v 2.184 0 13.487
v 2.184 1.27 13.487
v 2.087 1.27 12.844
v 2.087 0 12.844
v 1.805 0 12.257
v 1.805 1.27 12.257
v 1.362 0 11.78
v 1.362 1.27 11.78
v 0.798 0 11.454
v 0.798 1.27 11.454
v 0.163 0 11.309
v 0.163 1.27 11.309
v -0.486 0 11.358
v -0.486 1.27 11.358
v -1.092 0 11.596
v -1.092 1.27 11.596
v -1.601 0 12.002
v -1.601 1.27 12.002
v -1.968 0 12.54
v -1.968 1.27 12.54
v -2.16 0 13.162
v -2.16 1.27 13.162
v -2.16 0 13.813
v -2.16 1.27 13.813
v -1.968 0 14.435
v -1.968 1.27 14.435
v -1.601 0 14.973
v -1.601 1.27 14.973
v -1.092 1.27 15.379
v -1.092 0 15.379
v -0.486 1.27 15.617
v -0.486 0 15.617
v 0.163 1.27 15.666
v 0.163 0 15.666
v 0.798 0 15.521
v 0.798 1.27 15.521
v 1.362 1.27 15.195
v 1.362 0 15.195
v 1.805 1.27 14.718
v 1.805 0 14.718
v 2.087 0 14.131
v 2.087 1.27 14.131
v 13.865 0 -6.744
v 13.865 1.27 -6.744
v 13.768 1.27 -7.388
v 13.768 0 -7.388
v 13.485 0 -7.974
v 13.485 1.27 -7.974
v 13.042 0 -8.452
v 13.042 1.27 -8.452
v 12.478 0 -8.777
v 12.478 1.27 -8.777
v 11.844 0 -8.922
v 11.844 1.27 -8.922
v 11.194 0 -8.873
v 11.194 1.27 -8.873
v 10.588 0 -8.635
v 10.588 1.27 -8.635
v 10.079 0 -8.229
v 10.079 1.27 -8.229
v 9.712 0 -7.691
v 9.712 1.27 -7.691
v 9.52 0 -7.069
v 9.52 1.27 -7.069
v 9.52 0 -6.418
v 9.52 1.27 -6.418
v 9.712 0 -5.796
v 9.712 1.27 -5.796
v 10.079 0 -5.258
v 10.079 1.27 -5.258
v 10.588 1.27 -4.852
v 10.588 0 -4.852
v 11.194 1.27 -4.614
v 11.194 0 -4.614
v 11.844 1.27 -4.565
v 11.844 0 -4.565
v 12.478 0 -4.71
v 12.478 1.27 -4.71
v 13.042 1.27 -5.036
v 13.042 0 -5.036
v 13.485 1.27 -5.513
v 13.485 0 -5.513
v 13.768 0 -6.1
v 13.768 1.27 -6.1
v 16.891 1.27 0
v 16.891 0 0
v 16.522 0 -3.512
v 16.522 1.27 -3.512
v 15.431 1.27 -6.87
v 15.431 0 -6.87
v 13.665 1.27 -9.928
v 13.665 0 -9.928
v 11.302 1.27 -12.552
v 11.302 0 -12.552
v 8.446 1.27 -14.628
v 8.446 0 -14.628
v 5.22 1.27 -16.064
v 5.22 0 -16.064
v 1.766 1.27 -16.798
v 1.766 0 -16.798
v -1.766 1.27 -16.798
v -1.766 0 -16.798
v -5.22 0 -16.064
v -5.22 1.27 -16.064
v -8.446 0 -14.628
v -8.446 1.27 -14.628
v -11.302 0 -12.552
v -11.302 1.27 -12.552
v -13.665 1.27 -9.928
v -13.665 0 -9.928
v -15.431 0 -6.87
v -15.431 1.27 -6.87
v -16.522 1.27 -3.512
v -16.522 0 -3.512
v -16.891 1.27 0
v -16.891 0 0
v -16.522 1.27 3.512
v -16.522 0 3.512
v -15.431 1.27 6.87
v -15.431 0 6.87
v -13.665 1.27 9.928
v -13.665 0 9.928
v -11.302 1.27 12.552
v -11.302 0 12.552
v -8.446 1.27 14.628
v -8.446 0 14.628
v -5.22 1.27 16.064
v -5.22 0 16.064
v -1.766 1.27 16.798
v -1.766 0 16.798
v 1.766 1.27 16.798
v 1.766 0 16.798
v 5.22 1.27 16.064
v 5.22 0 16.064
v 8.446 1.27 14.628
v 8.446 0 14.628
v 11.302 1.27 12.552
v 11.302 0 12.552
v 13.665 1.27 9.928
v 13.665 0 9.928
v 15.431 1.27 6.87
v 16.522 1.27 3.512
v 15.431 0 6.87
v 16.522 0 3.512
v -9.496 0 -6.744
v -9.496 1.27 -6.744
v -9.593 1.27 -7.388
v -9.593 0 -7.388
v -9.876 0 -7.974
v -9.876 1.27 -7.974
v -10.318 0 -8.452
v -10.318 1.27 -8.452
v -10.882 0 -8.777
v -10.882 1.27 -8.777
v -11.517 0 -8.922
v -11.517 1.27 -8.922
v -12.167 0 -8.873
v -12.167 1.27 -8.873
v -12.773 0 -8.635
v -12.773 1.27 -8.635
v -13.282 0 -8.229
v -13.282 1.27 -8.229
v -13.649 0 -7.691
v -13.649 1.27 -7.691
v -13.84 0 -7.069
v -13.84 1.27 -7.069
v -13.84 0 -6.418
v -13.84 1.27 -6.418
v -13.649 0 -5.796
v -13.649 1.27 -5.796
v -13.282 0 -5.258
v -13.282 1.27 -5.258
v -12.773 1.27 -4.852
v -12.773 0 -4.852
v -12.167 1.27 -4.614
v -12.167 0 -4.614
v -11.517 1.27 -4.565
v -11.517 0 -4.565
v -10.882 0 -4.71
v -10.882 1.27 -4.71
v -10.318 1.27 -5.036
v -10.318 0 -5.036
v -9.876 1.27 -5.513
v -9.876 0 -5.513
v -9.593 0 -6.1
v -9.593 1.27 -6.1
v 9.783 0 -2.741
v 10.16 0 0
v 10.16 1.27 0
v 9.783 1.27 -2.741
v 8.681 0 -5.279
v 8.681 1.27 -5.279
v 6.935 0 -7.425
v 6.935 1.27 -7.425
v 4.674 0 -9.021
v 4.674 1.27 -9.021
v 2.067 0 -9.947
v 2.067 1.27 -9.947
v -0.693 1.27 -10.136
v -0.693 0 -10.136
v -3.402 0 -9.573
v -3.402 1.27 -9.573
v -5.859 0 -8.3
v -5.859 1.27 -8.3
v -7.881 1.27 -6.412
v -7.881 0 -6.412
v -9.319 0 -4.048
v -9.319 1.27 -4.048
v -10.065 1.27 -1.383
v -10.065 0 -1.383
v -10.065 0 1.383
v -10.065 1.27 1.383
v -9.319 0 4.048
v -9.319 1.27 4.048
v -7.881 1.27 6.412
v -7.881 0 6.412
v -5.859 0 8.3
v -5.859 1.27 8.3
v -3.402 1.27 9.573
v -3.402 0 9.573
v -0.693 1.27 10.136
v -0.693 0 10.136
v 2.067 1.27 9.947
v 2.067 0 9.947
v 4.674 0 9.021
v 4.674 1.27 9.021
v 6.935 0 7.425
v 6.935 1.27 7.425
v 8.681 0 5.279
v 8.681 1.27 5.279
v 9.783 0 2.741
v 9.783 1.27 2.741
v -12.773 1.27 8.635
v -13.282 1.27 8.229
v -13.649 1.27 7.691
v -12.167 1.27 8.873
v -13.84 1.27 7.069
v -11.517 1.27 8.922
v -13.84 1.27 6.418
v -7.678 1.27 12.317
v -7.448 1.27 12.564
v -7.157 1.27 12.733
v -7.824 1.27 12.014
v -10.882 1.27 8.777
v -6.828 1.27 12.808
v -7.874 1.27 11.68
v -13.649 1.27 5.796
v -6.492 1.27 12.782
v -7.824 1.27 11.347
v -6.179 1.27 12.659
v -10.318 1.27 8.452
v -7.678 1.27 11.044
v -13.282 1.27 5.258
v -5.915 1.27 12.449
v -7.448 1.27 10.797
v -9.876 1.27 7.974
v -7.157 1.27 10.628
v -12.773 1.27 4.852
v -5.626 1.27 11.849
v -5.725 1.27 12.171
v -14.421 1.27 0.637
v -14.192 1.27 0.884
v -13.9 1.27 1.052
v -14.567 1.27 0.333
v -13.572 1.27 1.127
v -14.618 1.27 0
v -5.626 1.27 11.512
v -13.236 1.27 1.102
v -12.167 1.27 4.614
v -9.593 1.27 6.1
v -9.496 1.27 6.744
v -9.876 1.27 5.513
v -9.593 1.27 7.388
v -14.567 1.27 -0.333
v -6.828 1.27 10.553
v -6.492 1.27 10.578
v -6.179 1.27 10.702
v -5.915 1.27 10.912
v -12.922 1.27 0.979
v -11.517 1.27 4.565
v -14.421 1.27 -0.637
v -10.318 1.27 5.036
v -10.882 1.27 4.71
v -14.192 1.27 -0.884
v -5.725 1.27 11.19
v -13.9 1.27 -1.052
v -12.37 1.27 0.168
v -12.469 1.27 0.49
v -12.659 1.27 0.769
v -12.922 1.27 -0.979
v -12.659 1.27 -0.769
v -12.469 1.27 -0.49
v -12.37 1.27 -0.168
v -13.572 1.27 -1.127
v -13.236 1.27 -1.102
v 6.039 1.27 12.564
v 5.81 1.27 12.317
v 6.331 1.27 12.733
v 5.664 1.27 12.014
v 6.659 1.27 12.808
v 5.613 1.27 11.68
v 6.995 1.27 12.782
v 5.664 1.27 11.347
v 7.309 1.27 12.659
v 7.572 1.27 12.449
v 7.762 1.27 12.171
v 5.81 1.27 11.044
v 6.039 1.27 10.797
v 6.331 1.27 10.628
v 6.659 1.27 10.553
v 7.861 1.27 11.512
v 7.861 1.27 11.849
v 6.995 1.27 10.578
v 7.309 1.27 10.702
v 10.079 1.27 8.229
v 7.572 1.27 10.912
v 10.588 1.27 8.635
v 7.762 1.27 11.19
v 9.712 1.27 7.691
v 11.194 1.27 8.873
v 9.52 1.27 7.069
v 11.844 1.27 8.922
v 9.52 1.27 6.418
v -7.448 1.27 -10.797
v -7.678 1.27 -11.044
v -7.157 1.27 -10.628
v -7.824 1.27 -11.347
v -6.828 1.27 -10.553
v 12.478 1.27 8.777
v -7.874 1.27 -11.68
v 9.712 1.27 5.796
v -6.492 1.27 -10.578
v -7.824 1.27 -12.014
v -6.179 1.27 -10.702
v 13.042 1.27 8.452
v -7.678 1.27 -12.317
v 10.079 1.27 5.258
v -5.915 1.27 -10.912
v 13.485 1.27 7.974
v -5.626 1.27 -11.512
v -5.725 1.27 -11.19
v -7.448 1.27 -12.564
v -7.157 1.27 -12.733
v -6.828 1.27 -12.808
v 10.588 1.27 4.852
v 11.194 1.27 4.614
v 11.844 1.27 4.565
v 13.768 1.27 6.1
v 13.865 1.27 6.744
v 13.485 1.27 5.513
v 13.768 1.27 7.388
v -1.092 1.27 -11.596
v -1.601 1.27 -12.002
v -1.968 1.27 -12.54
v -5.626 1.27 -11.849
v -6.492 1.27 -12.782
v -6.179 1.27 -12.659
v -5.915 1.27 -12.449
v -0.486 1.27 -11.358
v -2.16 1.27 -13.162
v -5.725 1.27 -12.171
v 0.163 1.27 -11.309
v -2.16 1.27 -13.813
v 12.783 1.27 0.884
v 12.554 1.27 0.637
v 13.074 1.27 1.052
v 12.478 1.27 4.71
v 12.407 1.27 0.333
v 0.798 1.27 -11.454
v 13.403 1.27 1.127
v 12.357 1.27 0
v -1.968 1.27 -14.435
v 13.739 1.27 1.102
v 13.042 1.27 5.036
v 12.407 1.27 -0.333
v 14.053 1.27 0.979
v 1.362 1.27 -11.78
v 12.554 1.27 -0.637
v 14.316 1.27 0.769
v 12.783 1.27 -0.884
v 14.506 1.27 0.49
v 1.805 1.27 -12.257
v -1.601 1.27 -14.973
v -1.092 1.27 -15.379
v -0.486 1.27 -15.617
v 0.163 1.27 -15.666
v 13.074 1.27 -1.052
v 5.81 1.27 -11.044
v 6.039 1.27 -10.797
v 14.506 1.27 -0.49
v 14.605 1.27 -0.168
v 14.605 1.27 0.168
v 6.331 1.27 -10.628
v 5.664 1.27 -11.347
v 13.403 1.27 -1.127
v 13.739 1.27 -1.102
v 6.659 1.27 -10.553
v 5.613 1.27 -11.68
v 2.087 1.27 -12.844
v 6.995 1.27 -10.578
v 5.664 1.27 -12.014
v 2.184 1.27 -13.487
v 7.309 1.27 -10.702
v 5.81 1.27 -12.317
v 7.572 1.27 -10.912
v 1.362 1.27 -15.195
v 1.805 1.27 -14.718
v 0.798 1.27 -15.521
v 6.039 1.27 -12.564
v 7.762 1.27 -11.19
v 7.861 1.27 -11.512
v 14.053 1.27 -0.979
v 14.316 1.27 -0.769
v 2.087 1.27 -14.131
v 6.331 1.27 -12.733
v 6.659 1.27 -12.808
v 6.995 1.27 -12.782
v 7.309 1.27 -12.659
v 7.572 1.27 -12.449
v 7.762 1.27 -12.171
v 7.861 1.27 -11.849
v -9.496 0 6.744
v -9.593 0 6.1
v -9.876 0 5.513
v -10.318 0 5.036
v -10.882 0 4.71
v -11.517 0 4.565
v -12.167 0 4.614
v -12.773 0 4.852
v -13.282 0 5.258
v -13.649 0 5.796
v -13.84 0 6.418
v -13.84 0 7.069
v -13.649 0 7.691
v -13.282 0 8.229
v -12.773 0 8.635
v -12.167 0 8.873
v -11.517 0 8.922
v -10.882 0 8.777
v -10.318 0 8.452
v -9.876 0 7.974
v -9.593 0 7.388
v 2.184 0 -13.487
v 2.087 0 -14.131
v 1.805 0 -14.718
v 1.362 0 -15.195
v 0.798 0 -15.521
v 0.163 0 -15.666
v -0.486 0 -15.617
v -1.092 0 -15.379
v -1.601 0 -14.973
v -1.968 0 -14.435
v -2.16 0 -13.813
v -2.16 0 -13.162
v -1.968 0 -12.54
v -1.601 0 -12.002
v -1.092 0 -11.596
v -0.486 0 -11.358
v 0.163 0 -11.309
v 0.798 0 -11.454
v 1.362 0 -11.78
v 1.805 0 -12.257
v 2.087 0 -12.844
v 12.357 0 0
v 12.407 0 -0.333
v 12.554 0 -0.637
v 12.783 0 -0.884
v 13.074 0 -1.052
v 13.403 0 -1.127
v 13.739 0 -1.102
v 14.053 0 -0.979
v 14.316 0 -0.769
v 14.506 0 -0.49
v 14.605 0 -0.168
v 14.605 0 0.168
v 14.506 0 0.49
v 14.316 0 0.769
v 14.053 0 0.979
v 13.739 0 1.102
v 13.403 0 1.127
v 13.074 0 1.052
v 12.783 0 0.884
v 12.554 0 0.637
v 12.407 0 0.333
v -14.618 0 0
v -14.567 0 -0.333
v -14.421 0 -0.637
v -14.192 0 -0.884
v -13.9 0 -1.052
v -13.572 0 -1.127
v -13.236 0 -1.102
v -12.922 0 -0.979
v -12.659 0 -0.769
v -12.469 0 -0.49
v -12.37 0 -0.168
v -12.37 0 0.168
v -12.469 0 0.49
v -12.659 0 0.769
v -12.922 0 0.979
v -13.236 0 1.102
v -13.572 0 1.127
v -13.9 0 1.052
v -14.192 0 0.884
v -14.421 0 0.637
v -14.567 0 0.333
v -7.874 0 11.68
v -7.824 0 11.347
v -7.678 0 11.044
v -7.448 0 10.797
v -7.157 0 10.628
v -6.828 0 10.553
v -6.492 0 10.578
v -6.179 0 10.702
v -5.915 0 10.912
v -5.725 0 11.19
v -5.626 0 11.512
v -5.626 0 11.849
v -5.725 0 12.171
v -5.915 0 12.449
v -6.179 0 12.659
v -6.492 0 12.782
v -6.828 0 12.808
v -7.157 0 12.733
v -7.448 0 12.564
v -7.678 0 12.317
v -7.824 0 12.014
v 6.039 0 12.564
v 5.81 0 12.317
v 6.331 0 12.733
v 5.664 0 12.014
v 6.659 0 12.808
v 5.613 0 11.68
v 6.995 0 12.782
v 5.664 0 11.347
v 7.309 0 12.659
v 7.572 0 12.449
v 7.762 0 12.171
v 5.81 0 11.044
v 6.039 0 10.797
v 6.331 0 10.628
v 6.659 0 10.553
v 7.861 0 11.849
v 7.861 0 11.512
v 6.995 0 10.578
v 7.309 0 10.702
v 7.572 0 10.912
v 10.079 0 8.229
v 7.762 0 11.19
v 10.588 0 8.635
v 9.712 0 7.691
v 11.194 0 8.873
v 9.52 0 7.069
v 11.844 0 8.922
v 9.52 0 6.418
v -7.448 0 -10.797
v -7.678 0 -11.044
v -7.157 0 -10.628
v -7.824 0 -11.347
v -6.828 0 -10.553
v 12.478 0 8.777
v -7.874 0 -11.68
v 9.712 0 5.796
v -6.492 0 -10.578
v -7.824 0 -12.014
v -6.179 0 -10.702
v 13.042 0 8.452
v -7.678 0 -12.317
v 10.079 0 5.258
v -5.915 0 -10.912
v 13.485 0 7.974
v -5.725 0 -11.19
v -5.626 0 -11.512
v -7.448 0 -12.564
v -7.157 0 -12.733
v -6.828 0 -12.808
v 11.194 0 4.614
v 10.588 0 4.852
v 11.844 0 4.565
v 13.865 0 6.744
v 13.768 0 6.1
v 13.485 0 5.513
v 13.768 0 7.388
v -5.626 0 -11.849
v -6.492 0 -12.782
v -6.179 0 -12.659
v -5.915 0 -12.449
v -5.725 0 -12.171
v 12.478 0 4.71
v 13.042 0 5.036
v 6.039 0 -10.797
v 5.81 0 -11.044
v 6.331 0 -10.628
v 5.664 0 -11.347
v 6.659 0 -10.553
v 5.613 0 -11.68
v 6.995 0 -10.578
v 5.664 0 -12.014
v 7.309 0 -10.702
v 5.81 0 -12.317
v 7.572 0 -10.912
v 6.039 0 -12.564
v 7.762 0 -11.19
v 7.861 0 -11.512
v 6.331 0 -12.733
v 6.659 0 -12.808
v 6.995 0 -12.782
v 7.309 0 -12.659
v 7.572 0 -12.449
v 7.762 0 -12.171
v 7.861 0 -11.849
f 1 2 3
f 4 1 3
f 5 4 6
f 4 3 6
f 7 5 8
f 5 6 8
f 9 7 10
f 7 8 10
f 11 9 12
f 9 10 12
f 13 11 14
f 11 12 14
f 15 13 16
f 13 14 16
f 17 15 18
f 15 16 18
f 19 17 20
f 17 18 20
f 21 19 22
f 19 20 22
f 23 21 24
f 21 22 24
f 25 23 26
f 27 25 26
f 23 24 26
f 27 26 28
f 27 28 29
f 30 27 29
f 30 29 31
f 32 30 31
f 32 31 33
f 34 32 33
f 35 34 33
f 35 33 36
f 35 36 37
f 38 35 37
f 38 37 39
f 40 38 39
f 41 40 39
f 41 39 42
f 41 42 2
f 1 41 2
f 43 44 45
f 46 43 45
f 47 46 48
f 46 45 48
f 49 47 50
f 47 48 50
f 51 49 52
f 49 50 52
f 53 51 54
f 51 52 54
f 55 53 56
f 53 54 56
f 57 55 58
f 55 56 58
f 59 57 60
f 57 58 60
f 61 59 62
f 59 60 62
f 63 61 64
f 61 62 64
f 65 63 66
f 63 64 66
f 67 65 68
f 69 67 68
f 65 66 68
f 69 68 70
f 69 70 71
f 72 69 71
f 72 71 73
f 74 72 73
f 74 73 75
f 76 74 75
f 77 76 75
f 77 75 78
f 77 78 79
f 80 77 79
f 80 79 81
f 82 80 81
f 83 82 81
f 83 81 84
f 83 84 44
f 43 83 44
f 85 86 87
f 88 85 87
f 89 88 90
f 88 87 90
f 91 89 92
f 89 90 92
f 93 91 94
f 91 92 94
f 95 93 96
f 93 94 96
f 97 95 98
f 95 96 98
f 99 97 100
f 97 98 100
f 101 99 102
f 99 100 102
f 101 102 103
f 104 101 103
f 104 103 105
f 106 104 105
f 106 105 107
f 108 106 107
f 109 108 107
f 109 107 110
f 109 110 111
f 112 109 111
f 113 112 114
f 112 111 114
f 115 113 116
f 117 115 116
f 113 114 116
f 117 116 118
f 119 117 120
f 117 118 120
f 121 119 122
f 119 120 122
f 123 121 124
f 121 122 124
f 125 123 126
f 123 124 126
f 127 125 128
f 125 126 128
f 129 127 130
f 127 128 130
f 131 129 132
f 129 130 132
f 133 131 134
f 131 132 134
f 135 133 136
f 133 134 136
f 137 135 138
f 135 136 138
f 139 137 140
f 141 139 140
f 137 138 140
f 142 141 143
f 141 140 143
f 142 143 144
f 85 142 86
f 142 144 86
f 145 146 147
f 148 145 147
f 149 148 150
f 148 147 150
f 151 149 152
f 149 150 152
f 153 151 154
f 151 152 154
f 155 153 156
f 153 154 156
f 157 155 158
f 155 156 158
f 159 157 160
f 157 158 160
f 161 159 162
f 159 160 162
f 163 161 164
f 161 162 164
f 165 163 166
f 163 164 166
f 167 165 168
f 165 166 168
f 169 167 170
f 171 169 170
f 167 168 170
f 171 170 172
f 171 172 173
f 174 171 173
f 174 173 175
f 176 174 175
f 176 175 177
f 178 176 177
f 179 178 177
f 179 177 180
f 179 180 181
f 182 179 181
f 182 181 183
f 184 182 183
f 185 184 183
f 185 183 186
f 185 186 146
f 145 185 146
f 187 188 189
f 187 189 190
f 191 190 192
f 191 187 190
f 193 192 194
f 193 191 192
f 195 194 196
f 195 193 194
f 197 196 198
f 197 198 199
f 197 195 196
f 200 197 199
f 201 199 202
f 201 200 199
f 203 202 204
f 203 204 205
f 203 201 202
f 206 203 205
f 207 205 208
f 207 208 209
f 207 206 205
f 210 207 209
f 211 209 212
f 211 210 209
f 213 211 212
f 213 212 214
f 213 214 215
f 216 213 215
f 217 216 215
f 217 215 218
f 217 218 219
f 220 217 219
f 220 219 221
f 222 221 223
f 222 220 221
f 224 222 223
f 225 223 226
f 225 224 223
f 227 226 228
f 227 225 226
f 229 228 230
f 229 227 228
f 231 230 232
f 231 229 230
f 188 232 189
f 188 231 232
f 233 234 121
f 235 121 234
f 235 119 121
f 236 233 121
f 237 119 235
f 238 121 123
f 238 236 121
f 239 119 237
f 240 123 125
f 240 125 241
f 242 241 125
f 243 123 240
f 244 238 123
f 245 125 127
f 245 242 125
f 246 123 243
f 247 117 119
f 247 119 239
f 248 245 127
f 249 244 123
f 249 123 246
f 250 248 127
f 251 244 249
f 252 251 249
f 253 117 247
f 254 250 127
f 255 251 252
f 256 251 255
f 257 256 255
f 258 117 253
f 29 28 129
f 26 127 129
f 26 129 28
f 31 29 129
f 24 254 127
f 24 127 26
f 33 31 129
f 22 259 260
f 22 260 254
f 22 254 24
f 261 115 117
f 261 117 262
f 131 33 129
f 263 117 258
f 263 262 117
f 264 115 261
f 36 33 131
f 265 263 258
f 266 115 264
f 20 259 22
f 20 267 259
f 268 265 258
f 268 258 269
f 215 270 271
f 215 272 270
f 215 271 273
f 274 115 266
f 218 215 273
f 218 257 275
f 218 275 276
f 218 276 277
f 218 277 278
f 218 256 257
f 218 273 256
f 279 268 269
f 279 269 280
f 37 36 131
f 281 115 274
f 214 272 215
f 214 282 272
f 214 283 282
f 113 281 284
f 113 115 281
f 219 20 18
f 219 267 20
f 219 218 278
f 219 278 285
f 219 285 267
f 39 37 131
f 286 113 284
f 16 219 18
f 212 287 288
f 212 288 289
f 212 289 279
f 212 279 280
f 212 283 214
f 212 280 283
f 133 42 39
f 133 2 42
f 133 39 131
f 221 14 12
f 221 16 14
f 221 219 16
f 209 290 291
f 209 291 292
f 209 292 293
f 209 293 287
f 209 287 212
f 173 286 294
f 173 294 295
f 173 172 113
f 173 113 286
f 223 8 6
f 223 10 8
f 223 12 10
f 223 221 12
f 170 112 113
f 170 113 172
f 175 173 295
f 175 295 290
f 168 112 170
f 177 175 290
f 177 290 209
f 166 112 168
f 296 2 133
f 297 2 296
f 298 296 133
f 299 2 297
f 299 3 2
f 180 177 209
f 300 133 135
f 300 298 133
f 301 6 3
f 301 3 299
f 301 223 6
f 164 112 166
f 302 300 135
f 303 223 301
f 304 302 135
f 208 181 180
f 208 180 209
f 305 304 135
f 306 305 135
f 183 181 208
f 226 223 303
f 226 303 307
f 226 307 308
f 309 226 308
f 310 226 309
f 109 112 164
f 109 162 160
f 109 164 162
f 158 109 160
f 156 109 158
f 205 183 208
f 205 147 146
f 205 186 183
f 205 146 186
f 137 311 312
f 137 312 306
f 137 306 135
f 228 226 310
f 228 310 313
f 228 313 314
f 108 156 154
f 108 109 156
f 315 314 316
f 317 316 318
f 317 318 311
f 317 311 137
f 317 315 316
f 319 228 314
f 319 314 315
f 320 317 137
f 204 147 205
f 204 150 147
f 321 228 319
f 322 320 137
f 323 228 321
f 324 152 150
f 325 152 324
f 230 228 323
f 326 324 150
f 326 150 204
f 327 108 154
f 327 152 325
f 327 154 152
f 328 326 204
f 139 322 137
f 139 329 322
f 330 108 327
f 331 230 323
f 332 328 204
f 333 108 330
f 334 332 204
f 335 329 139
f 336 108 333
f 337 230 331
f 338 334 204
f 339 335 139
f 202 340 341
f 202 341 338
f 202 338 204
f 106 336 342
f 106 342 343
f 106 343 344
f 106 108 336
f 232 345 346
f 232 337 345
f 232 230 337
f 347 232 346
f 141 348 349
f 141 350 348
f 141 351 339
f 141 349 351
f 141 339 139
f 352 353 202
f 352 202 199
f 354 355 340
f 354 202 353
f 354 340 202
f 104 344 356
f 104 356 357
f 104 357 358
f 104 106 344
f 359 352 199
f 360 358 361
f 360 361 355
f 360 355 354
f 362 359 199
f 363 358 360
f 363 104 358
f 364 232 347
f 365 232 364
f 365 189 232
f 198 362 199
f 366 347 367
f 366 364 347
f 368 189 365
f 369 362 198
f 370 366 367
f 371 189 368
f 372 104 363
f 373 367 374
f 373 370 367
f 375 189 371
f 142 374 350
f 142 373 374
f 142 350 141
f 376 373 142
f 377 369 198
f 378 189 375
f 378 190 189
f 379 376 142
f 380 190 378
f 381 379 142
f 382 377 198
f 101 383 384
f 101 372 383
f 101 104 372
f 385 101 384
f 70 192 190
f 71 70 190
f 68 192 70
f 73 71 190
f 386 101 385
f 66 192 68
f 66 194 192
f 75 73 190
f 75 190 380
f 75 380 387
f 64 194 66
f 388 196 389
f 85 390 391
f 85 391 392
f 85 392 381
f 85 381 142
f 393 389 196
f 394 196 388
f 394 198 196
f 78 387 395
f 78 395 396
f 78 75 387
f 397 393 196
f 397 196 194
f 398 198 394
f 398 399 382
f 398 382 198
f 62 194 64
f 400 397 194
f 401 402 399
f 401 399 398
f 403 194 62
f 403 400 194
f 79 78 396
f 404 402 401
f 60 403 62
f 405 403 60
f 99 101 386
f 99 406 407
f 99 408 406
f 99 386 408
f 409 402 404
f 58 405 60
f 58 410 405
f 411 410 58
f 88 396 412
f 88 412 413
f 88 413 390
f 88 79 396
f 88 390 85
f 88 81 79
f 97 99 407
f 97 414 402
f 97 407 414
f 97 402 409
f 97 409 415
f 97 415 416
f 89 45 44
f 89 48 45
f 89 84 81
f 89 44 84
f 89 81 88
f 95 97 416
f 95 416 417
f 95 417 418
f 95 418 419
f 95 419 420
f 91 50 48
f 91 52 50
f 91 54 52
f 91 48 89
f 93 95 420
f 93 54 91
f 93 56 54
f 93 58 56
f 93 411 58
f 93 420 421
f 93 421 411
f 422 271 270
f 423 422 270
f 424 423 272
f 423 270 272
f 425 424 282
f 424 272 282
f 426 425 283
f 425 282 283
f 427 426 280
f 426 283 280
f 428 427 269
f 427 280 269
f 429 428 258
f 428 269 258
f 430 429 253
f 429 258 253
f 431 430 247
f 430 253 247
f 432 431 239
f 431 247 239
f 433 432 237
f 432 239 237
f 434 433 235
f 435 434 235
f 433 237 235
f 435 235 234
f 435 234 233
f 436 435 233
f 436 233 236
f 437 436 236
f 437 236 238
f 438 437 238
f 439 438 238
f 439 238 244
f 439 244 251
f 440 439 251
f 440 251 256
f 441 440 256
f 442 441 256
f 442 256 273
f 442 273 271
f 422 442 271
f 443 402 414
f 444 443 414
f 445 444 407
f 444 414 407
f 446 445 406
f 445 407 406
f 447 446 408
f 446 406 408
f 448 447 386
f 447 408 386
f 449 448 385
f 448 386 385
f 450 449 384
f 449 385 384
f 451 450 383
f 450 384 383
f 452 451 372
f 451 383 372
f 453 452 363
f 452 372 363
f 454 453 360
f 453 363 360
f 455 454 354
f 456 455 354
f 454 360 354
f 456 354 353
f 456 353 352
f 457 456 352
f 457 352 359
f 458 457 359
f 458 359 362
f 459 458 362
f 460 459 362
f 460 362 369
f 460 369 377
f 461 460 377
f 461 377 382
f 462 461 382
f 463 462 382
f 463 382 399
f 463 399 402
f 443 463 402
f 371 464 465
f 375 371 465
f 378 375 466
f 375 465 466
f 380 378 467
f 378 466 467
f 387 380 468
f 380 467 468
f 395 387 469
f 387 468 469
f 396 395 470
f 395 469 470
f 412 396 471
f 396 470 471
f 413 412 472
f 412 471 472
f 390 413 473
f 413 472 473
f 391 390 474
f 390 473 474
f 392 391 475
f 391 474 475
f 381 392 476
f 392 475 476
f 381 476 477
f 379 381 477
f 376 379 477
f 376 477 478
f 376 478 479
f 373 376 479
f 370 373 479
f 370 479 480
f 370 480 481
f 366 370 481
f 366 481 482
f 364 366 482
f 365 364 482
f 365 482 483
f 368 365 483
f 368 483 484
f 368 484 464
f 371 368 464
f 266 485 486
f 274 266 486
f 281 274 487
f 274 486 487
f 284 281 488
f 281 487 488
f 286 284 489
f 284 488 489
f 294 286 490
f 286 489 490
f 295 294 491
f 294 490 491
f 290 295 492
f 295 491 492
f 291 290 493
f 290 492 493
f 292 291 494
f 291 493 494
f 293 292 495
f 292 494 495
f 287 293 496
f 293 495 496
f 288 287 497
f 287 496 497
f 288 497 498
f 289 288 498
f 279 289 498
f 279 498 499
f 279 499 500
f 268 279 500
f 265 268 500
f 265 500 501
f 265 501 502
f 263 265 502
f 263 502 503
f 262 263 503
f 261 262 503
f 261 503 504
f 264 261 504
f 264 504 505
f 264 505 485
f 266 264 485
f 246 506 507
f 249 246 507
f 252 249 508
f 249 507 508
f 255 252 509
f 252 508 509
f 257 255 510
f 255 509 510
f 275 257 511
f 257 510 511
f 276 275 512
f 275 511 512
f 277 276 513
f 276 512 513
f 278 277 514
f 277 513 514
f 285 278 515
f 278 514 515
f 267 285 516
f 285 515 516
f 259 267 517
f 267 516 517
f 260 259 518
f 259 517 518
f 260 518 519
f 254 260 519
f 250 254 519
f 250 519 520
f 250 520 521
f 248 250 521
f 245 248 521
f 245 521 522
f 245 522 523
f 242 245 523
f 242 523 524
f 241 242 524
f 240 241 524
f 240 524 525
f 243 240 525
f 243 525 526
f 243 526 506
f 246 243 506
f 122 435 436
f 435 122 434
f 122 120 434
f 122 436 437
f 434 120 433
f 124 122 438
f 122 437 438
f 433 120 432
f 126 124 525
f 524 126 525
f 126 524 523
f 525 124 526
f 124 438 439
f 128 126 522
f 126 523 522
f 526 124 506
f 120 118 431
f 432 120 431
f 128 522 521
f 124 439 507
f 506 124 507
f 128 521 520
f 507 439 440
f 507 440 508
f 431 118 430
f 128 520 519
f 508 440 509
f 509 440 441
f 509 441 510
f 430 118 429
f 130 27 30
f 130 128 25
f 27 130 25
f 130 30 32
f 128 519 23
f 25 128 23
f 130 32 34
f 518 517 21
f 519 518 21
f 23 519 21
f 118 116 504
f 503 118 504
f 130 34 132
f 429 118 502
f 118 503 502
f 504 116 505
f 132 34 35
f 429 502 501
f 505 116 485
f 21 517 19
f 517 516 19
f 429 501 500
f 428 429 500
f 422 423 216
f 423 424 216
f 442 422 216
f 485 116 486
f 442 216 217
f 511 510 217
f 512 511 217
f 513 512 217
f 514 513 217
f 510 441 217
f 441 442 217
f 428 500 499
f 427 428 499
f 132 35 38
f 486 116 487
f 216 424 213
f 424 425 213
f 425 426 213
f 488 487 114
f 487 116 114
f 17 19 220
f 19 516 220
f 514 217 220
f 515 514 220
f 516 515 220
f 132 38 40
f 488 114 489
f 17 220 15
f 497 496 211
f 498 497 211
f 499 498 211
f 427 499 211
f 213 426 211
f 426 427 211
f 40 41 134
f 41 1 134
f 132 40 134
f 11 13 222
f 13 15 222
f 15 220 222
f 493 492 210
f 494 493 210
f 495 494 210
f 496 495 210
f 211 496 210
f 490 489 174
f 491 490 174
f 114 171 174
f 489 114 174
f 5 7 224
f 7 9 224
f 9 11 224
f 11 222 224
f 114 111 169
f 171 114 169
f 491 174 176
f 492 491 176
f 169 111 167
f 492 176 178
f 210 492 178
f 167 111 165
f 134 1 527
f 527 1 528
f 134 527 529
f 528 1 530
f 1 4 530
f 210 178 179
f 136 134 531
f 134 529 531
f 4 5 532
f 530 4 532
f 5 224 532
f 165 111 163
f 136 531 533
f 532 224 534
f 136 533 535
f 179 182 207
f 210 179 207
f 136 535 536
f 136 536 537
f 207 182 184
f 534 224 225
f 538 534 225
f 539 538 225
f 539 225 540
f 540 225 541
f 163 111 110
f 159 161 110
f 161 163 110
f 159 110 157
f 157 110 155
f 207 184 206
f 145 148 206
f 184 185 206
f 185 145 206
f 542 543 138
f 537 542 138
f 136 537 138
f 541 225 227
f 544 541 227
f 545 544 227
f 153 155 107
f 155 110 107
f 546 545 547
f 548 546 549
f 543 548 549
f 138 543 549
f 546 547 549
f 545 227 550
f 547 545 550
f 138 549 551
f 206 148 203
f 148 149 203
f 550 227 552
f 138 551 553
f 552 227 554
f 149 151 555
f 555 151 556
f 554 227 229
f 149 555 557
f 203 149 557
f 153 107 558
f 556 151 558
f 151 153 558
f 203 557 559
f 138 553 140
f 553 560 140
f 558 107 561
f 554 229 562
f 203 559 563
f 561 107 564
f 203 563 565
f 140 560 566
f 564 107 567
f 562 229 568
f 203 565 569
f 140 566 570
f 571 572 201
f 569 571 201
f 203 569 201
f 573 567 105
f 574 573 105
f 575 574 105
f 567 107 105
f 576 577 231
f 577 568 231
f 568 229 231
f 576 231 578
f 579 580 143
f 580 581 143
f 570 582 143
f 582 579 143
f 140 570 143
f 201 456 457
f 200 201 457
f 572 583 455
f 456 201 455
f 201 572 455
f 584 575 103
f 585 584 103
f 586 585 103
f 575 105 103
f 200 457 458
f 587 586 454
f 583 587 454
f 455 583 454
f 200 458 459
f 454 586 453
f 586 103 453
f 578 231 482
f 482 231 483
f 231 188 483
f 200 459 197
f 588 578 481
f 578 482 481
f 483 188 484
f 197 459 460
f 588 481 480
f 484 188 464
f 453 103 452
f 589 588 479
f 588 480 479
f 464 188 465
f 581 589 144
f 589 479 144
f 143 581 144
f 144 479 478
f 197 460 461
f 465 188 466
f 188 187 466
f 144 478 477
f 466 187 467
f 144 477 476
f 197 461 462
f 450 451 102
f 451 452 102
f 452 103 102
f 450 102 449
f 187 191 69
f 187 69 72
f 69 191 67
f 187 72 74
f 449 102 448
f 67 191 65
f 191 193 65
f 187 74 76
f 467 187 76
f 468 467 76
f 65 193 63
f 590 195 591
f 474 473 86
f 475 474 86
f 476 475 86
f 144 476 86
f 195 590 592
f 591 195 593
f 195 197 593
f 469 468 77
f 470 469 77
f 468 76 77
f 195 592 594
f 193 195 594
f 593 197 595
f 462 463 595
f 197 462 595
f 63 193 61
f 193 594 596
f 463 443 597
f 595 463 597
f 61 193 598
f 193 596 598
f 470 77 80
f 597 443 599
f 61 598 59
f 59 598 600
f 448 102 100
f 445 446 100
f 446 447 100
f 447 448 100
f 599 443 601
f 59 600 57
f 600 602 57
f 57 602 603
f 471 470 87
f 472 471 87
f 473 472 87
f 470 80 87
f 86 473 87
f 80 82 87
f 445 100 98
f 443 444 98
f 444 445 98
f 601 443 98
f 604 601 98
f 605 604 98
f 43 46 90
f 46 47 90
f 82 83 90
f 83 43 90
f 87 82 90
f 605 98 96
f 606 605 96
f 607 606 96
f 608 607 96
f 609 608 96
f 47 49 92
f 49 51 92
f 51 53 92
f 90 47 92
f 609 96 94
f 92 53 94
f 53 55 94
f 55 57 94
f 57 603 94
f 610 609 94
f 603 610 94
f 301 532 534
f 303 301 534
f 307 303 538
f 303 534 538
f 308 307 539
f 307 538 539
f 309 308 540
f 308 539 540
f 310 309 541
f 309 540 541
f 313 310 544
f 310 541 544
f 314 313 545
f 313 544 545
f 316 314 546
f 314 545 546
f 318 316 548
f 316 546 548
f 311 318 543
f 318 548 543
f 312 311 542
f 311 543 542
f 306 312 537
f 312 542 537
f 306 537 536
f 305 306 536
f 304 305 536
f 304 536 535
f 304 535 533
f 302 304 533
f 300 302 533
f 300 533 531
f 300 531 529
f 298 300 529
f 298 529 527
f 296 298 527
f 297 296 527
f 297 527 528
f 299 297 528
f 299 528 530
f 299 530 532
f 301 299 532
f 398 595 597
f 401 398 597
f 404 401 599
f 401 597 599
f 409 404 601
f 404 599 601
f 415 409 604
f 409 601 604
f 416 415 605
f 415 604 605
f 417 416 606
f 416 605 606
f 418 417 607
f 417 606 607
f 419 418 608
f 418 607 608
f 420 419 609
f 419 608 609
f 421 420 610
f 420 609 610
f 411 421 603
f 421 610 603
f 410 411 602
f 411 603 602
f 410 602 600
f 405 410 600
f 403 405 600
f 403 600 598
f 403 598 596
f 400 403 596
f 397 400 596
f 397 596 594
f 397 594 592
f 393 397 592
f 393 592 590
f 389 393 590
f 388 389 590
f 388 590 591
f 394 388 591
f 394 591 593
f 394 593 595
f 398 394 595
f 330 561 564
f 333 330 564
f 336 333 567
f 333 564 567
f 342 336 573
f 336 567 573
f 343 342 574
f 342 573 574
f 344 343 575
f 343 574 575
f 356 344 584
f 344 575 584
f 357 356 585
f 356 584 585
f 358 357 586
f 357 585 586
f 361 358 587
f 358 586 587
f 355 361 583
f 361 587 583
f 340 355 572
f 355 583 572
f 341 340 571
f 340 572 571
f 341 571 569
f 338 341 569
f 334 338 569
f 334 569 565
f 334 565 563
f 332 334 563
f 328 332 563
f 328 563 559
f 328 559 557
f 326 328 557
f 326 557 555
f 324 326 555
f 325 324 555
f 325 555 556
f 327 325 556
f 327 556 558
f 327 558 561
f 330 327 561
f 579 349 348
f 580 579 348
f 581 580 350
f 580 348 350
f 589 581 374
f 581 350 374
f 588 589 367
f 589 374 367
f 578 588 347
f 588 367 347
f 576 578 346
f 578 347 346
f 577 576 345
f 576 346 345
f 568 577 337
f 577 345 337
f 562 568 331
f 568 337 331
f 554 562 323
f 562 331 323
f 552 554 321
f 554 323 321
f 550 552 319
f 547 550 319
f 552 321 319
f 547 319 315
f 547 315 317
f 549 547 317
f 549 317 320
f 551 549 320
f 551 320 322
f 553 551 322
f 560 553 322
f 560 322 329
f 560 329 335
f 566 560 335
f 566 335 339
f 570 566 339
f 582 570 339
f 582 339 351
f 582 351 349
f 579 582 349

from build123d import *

# Parameters (mm, degrees)
SKETCH1_R             = 16.891
SKETCH1_R_2           = 10.16
BOSS_EXTRUDE1_DEPTH   = 1.27
SKETCH2_R             = 2.1844
CUT_EXTRUDE1_DEPTH    = 2.27
F_4_40_TAPPED_HOLE1_D = 2.2606


with BuildPart() as part:
    # Sketch1 → Boss-Extrude1 (new body)
    with BuildSketch(Plane(origin=(0, 0, 0), x_dir=(1, 0, 0), z_dir=(0, 1, 0))):
        Circle(SKETCH1_R)
        Circle(SKETCH1_R_2, mode=Mode.SUBTRACT)
    extrude(amount=BOSS_EXTRUDE1_DEPTH)

    # Sketch2 → Cut-Extrude1 (cut, through all)
    with BuildSketch(Plane(origin=(0, 1.27, 0), x_dir=(1, 0, 0), z_dir=(0, 1, 0))):
        with Locations((0, 13.4874)):
            Circle(SKETCH2_R)
        with Locations((-11.680431031, 6.7437)):
            Circle(SKETCH2_R)
        with Locations((-11.680431031, -6.7437)):
            Circle(SKETCH2_R)
        with Locations((0, -13.4874)):
            Circle(SKETCH2_R)
        with Locations((11.680431031, -6.7437)):
            Circle(SKETCH2_R)
        with Locations((11.680431031, 6.7437)):
            Circle(SKETCH2_R)
    extrude(amount=-CUT_EXTRUDE1_DEPTH, mode=Mode.SUBTRACT)

    # #4-40 Tapped Hole1 (through all)
    with Locations(Plane(origin=(0, 1.27, 0), x_dir=(1, 0, 0), z_dir=(0, 1, 0))):
        with Locations((0, 0), (-6.7437, 11.680431031), (6.7437, 11.680431031), (13.4874, 0), (6.7437, -11.680431031), (-6.7437, -11.680431031), (-13.4874, 0)):
            Hole(F_4_40_TAPPED_HOLE1_D / 2)


solid = part.part
